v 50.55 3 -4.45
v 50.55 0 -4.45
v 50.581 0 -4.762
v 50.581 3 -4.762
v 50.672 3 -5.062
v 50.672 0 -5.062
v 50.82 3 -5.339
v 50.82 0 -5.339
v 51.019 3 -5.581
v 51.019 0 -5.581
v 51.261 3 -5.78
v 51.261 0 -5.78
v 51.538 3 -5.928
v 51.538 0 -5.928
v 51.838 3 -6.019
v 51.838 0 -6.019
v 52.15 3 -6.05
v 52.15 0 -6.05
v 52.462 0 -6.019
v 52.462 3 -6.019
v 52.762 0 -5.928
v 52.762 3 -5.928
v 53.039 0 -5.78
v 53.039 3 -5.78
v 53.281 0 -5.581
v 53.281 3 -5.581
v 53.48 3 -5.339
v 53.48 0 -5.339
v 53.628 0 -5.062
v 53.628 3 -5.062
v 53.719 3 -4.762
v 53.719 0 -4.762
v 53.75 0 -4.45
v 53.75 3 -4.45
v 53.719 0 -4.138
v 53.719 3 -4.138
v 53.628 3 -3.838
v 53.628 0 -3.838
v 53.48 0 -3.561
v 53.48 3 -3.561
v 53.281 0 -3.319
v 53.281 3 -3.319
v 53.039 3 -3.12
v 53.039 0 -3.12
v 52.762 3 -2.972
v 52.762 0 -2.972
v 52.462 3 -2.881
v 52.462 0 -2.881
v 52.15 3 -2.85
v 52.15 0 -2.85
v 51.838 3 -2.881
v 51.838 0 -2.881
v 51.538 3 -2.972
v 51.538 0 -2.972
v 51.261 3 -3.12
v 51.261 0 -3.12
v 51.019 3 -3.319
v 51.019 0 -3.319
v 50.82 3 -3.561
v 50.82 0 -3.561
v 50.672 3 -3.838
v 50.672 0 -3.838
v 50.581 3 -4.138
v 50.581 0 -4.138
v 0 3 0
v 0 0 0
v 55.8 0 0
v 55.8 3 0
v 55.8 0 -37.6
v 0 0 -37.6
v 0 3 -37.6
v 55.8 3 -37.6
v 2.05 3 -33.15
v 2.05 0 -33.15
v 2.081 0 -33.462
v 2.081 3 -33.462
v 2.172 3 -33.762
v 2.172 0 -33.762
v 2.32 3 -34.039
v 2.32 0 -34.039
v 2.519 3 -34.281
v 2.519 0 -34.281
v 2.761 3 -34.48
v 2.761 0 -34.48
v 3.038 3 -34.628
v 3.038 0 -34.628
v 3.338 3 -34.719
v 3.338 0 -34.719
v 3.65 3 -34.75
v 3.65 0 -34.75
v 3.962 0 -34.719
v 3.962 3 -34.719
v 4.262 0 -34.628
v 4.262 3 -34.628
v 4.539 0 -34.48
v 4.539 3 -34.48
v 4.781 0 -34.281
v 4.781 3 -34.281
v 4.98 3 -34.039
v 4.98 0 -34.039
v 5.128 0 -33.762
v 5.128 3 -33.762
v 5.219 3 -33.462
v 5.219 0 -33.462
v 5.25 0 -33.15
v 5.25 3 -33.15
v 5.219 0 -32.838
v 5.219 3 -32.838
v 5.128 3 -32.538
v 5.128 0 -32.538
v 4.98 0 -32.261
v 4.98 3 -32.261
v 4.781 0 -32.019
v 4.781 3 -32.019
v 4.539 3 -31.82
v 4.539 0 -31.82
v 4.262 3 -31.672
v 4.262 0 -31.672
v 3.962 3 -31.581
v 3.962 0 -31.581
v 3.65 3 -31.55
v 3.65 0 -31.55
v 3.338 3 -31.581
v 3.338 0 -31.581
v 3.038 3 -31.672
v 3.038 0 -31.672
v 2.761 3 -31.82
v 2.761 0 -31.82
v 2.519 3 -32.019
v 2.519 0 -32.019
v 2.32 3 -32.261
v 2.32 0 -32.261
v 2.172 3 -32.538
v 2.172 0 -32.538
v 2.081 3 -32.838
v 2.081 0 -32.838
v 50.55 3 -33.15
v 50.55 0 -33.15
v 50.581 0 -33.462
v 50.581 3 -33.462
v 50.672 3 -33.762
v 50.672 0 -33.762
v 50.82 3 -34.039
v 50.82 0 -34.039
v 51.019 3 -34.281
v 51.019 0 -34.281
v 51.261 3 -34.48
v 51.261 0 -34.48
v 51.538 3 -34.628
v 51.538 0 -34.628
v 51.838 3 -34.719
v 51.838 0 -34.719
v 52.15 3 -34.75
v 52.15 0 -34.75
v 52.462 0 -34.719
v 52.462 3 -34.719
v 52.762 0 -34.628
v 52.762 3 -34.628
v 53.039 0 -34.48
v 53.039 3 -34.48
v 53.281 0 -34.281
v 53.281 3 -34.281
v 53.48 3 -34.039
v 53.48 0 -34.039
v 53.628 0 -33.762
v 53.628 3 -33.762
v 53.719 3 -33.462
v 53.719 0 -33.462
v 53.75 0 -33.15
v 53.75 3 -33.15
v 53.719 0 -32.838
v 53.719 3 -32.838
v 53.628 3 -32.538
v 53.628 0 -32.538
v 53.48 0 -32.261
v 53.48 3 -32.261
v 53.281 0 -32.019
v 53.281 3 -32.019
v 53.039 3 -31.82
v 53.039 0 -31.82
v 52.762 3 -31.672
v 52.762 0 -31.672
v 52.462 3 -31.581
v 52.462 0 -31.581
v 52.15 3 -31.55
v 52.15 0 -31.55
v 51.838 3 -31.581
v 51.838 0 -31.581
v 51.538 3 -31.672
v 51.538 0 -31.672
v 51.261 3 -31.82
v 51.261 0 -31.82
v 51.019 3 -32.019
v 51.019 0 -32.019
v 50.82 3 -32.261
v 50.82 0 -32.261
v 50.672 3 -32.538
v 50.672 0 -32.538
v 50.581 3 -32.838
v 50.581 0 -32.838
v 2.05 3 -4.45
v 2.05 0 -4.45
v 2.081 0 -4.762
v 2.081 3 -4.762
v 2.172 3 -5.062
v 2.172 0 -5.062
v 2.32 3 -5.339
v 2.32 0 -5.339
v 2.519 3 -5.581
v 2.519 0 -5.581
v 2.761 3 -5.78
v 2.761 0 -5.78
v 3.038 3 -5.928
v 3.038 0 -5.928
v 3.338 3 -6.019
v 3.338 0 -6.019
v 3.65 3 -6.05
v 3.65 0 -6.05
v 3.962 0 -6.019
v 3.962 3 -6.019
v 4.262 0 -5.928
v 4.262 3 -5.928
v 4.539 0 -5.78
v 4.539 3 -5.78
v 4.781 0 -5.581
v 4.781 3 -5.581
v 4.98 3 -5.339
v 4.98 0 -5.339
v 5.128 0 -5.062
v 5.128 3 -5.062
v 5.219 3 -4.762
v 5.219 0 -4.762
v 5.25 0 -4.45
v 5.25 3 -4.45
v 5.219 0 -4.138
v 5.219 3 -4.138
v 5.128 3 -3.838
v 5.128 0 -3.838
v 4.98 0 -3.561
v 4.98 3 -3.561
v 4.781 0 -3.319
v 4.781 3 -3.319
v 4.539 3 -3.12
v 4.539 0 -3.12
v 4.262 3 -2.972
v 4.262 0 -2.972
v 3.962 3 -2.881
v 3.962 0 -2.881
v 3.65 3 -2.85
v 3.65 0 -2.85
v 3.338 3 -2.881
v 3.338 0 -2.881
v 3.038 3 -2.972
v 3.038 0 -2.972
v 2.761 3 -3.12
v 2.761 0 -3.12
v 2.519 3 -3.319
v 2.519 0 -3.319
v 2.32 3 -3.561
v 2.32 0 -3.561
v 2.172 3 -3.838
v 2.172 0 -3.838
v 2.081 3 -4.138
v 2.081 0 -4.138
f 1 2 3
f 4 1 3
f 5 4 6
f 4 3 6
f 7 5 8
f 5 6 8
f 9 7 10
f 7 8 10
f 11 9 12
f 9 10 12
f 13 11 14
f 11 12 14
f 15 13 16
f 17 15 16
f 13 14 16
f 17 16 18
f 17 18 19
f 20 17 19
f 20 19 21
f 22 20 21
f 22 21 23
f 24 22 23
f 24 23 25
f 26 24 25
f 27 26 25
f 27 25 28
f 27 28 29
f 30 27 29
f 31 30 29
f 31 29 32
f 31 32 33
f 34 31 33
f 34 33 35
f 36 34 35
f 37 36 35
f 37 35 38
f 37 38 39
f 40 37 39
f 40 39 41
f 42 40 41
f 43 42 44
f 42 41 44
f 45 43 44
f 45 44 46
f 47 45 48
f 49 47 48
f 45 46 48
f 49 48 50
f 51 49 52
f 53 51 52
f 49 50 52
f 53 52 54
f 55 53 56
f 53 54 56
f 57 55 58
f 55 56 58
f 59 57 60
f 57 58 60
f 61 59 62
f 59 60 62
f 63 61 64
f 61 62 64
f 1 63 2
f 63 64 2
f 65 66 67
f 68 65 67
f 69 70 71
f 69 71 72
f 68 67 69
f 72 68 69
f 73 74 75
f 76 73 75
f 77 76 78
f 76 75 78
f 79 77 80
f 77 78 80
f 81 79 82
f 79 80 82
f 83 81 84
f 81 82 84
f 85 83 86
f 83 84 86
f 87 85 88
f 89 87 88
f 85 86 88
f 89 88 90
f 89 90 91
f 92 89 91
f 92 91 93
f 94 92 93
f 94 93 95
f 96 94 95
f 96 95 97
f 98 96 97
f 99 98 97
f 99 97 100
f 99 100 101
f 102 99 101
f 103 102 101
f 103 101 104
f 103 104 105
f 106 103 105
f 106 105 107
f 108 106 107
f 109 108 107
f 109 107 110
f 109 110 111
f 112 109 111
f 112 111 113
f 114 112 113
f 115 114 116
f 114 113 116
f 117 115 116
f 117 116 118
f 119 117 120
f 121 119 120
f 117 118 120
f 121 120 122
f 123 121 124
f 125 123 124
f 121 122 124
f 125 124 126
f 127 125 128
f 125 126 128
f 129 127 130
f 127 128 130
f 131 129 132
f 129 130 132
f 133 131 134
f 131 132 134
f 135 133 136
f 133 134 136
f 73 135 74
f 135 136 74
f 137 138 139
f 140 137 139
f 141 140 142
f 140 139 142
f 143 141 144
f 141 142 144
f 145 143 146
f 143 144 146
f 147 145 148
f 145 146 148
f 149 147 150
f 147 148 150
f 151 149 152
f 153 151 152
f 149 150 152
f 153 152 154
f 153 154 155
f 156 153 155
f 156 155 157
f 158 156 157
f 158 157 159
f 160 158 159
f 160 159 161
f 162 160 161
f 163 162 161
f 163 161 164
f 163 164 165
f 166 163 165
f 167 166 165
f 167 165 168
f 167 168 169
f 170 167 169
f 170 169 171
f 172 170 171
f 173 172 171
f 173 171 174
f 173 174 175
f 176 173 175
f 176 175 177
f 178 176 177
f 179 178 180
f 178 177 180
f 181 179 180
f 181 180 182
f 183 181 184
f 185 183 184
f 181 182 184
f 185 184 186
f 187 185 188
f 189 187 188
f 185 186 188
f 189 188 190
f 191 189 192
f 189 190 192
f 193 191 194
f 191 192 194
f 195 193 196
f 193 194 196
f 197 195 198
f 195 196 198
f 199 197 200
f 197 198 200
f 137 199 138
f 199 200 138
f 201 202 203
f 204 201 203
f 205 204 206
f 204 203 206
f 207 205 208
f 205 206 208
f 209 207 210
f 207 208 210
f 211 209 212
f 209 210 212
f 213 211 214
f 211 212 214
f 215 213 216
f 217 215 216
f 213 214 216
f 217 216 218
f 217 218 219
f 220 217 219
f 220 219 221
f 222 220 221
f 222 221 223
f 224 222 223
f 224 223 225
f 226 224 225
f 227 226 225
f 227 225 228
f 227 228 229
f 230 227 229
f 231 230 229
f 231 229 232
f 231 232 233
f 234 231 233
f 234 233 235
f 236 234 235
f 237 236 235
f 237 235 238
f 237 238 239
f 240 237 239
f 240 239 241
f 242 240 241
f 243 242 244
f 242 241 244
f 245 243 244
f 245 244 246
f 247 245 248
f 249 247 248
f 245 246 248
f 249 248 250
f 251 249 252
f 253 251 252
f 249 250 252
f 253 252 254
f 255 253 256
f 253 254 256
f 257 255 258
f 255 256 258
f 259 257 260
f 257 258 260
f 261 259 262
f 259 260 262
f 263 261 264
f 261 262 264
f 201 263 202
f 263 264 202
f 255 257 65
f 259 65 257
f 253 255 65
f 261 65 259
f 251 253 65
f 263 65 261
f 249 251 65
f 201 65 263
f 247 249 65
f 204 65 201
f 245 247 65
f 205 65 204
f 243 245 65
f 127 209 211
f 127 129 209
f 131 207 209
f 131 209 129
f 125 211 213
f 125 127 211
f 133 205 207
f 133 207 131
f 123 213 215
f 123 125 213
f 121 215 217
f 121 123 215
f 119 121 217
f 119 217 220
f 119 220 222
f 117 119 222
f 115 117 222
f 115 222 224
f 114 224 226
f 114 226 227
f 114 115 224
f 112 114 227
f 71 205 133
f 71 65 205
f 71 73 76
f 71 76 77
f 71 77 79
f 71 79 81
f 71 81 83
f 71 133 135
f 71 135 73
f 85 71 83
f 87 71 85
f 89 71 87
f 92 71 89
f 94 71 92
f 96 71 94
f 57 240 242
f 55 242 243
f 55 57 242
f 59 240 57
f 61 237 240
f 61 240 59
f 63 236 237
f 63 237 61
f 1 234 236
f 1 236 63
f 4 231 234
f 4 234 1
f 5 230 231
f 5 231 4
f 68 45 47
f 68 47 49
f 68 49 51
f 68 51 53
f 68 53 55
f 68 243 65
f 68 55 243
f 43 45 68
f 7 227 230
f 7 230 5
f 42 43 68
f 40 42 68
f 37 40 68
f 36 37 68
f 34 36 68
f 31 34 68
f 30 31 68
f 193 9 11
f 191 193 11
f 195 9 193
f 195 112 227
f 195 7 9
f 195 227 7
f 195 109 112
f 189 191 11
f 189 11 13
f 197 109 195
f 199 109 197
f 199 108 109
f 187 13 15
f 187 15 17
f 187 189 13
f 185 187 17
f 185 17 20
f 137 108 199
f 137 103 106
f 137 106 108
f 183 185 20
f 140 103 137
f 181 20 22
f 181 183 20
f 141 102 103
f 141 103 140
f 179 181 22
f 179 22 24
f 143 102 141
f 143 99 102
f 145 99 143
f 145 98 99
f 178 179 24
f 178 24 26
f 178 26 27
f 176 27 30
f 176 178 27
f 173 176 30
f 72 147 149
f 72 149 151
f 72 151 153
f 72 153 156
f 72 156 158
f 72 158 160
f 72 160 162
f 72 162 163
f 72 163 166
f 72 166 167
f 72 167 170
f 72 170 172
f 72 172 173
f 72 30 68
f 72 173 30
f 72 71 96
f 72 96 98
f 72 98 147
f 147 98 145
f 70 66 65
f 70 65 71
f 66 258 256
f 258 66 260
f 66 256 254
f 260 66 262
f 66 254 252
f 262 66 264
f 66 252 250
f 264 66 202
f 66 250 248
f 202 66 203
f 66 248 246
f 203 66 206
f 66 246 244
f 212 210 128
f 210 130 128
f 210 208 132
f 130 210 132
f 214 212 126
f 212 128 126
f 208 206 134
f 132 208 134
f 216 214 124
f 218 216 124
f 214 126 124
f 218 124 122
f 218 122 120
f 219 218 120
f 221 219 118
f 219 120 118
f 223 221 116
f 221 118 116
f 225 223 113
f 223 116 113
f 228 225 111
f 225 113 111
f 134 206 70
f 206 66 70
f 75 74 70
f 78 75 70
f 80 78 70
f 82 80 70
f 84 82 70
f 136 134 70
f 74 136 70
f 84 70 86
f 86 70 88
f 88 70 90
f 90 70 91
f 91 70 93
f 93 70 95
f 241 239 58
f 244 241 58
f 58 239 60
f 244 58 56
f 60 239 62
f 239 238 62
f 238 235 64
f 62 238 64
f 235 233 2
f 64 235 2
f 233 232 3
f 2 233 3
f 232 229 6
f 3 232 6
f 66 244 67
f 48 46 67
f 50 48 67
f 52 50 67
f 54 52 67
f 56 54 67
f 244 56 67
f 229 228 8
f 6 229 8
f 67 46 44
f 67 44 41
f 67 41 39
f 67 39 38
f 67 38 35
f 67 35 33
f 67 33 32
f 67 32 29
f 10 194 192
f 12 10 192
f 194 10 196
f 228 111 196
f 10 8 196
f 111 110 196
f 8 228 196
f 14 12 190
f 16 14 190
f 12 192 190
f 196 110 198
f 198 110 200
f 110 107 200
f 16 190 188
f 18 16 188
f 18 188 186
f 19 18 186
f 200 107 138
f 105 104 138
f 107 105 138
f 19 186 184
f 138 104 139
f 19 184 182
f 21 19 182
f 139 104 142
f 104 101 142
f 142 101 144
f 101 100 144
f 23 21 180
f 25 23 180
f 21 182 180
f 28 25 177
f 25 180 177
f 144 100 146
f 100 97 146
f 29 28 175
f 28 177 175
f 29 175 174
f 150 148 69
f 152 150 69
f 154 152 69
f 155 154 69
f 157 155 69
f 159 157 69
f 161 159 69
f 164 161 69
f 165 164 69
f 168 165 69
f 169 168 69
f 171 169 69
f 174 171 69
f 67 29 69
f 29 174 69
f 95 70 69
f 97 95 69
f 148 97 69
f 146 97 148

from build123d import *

# Parameters (mm, degrees)
SKETCH1_W                = 55.8
SKETCH1_H                = 37.6
BOSS_EXTRUDE1_DEPTH      = 3
M3_CLEARANCE_HOLE1_D     = 3.2
M3_CLEARANCE_HOLE1_DEPTH = 3


with BuildPart() as part:
    # Sketch1 → Boss-Extrude1 (new body)
    with BuildSketch(Plane(origin=(0, 0, 0), x_dir=(1, 0, 0), z_dir=(0, 1, 0))):
        with Locations((27.9, 18.8)):
            Rectangle(SKETCH1_W, SKETCH1_H)
    extrude(amount=BOSS_EXTRUDE1_DEPTH)

    # M3 Clearance Hole1
    with Locations(Plane(origin=(0, 3, 0), x_dir=(1, 0, 0), z_dir=(0, 1, 0))):
        with Locations((3.65, 33.15), (52.15, 33.15), (52.15, 4.45), (3.65, 4.45)):
            Hole(M3_CLEARANCE_HOLE1_D / 2, depth=M3_CLEARANCE_HOLE1_DEPTH)


solid = part.part
